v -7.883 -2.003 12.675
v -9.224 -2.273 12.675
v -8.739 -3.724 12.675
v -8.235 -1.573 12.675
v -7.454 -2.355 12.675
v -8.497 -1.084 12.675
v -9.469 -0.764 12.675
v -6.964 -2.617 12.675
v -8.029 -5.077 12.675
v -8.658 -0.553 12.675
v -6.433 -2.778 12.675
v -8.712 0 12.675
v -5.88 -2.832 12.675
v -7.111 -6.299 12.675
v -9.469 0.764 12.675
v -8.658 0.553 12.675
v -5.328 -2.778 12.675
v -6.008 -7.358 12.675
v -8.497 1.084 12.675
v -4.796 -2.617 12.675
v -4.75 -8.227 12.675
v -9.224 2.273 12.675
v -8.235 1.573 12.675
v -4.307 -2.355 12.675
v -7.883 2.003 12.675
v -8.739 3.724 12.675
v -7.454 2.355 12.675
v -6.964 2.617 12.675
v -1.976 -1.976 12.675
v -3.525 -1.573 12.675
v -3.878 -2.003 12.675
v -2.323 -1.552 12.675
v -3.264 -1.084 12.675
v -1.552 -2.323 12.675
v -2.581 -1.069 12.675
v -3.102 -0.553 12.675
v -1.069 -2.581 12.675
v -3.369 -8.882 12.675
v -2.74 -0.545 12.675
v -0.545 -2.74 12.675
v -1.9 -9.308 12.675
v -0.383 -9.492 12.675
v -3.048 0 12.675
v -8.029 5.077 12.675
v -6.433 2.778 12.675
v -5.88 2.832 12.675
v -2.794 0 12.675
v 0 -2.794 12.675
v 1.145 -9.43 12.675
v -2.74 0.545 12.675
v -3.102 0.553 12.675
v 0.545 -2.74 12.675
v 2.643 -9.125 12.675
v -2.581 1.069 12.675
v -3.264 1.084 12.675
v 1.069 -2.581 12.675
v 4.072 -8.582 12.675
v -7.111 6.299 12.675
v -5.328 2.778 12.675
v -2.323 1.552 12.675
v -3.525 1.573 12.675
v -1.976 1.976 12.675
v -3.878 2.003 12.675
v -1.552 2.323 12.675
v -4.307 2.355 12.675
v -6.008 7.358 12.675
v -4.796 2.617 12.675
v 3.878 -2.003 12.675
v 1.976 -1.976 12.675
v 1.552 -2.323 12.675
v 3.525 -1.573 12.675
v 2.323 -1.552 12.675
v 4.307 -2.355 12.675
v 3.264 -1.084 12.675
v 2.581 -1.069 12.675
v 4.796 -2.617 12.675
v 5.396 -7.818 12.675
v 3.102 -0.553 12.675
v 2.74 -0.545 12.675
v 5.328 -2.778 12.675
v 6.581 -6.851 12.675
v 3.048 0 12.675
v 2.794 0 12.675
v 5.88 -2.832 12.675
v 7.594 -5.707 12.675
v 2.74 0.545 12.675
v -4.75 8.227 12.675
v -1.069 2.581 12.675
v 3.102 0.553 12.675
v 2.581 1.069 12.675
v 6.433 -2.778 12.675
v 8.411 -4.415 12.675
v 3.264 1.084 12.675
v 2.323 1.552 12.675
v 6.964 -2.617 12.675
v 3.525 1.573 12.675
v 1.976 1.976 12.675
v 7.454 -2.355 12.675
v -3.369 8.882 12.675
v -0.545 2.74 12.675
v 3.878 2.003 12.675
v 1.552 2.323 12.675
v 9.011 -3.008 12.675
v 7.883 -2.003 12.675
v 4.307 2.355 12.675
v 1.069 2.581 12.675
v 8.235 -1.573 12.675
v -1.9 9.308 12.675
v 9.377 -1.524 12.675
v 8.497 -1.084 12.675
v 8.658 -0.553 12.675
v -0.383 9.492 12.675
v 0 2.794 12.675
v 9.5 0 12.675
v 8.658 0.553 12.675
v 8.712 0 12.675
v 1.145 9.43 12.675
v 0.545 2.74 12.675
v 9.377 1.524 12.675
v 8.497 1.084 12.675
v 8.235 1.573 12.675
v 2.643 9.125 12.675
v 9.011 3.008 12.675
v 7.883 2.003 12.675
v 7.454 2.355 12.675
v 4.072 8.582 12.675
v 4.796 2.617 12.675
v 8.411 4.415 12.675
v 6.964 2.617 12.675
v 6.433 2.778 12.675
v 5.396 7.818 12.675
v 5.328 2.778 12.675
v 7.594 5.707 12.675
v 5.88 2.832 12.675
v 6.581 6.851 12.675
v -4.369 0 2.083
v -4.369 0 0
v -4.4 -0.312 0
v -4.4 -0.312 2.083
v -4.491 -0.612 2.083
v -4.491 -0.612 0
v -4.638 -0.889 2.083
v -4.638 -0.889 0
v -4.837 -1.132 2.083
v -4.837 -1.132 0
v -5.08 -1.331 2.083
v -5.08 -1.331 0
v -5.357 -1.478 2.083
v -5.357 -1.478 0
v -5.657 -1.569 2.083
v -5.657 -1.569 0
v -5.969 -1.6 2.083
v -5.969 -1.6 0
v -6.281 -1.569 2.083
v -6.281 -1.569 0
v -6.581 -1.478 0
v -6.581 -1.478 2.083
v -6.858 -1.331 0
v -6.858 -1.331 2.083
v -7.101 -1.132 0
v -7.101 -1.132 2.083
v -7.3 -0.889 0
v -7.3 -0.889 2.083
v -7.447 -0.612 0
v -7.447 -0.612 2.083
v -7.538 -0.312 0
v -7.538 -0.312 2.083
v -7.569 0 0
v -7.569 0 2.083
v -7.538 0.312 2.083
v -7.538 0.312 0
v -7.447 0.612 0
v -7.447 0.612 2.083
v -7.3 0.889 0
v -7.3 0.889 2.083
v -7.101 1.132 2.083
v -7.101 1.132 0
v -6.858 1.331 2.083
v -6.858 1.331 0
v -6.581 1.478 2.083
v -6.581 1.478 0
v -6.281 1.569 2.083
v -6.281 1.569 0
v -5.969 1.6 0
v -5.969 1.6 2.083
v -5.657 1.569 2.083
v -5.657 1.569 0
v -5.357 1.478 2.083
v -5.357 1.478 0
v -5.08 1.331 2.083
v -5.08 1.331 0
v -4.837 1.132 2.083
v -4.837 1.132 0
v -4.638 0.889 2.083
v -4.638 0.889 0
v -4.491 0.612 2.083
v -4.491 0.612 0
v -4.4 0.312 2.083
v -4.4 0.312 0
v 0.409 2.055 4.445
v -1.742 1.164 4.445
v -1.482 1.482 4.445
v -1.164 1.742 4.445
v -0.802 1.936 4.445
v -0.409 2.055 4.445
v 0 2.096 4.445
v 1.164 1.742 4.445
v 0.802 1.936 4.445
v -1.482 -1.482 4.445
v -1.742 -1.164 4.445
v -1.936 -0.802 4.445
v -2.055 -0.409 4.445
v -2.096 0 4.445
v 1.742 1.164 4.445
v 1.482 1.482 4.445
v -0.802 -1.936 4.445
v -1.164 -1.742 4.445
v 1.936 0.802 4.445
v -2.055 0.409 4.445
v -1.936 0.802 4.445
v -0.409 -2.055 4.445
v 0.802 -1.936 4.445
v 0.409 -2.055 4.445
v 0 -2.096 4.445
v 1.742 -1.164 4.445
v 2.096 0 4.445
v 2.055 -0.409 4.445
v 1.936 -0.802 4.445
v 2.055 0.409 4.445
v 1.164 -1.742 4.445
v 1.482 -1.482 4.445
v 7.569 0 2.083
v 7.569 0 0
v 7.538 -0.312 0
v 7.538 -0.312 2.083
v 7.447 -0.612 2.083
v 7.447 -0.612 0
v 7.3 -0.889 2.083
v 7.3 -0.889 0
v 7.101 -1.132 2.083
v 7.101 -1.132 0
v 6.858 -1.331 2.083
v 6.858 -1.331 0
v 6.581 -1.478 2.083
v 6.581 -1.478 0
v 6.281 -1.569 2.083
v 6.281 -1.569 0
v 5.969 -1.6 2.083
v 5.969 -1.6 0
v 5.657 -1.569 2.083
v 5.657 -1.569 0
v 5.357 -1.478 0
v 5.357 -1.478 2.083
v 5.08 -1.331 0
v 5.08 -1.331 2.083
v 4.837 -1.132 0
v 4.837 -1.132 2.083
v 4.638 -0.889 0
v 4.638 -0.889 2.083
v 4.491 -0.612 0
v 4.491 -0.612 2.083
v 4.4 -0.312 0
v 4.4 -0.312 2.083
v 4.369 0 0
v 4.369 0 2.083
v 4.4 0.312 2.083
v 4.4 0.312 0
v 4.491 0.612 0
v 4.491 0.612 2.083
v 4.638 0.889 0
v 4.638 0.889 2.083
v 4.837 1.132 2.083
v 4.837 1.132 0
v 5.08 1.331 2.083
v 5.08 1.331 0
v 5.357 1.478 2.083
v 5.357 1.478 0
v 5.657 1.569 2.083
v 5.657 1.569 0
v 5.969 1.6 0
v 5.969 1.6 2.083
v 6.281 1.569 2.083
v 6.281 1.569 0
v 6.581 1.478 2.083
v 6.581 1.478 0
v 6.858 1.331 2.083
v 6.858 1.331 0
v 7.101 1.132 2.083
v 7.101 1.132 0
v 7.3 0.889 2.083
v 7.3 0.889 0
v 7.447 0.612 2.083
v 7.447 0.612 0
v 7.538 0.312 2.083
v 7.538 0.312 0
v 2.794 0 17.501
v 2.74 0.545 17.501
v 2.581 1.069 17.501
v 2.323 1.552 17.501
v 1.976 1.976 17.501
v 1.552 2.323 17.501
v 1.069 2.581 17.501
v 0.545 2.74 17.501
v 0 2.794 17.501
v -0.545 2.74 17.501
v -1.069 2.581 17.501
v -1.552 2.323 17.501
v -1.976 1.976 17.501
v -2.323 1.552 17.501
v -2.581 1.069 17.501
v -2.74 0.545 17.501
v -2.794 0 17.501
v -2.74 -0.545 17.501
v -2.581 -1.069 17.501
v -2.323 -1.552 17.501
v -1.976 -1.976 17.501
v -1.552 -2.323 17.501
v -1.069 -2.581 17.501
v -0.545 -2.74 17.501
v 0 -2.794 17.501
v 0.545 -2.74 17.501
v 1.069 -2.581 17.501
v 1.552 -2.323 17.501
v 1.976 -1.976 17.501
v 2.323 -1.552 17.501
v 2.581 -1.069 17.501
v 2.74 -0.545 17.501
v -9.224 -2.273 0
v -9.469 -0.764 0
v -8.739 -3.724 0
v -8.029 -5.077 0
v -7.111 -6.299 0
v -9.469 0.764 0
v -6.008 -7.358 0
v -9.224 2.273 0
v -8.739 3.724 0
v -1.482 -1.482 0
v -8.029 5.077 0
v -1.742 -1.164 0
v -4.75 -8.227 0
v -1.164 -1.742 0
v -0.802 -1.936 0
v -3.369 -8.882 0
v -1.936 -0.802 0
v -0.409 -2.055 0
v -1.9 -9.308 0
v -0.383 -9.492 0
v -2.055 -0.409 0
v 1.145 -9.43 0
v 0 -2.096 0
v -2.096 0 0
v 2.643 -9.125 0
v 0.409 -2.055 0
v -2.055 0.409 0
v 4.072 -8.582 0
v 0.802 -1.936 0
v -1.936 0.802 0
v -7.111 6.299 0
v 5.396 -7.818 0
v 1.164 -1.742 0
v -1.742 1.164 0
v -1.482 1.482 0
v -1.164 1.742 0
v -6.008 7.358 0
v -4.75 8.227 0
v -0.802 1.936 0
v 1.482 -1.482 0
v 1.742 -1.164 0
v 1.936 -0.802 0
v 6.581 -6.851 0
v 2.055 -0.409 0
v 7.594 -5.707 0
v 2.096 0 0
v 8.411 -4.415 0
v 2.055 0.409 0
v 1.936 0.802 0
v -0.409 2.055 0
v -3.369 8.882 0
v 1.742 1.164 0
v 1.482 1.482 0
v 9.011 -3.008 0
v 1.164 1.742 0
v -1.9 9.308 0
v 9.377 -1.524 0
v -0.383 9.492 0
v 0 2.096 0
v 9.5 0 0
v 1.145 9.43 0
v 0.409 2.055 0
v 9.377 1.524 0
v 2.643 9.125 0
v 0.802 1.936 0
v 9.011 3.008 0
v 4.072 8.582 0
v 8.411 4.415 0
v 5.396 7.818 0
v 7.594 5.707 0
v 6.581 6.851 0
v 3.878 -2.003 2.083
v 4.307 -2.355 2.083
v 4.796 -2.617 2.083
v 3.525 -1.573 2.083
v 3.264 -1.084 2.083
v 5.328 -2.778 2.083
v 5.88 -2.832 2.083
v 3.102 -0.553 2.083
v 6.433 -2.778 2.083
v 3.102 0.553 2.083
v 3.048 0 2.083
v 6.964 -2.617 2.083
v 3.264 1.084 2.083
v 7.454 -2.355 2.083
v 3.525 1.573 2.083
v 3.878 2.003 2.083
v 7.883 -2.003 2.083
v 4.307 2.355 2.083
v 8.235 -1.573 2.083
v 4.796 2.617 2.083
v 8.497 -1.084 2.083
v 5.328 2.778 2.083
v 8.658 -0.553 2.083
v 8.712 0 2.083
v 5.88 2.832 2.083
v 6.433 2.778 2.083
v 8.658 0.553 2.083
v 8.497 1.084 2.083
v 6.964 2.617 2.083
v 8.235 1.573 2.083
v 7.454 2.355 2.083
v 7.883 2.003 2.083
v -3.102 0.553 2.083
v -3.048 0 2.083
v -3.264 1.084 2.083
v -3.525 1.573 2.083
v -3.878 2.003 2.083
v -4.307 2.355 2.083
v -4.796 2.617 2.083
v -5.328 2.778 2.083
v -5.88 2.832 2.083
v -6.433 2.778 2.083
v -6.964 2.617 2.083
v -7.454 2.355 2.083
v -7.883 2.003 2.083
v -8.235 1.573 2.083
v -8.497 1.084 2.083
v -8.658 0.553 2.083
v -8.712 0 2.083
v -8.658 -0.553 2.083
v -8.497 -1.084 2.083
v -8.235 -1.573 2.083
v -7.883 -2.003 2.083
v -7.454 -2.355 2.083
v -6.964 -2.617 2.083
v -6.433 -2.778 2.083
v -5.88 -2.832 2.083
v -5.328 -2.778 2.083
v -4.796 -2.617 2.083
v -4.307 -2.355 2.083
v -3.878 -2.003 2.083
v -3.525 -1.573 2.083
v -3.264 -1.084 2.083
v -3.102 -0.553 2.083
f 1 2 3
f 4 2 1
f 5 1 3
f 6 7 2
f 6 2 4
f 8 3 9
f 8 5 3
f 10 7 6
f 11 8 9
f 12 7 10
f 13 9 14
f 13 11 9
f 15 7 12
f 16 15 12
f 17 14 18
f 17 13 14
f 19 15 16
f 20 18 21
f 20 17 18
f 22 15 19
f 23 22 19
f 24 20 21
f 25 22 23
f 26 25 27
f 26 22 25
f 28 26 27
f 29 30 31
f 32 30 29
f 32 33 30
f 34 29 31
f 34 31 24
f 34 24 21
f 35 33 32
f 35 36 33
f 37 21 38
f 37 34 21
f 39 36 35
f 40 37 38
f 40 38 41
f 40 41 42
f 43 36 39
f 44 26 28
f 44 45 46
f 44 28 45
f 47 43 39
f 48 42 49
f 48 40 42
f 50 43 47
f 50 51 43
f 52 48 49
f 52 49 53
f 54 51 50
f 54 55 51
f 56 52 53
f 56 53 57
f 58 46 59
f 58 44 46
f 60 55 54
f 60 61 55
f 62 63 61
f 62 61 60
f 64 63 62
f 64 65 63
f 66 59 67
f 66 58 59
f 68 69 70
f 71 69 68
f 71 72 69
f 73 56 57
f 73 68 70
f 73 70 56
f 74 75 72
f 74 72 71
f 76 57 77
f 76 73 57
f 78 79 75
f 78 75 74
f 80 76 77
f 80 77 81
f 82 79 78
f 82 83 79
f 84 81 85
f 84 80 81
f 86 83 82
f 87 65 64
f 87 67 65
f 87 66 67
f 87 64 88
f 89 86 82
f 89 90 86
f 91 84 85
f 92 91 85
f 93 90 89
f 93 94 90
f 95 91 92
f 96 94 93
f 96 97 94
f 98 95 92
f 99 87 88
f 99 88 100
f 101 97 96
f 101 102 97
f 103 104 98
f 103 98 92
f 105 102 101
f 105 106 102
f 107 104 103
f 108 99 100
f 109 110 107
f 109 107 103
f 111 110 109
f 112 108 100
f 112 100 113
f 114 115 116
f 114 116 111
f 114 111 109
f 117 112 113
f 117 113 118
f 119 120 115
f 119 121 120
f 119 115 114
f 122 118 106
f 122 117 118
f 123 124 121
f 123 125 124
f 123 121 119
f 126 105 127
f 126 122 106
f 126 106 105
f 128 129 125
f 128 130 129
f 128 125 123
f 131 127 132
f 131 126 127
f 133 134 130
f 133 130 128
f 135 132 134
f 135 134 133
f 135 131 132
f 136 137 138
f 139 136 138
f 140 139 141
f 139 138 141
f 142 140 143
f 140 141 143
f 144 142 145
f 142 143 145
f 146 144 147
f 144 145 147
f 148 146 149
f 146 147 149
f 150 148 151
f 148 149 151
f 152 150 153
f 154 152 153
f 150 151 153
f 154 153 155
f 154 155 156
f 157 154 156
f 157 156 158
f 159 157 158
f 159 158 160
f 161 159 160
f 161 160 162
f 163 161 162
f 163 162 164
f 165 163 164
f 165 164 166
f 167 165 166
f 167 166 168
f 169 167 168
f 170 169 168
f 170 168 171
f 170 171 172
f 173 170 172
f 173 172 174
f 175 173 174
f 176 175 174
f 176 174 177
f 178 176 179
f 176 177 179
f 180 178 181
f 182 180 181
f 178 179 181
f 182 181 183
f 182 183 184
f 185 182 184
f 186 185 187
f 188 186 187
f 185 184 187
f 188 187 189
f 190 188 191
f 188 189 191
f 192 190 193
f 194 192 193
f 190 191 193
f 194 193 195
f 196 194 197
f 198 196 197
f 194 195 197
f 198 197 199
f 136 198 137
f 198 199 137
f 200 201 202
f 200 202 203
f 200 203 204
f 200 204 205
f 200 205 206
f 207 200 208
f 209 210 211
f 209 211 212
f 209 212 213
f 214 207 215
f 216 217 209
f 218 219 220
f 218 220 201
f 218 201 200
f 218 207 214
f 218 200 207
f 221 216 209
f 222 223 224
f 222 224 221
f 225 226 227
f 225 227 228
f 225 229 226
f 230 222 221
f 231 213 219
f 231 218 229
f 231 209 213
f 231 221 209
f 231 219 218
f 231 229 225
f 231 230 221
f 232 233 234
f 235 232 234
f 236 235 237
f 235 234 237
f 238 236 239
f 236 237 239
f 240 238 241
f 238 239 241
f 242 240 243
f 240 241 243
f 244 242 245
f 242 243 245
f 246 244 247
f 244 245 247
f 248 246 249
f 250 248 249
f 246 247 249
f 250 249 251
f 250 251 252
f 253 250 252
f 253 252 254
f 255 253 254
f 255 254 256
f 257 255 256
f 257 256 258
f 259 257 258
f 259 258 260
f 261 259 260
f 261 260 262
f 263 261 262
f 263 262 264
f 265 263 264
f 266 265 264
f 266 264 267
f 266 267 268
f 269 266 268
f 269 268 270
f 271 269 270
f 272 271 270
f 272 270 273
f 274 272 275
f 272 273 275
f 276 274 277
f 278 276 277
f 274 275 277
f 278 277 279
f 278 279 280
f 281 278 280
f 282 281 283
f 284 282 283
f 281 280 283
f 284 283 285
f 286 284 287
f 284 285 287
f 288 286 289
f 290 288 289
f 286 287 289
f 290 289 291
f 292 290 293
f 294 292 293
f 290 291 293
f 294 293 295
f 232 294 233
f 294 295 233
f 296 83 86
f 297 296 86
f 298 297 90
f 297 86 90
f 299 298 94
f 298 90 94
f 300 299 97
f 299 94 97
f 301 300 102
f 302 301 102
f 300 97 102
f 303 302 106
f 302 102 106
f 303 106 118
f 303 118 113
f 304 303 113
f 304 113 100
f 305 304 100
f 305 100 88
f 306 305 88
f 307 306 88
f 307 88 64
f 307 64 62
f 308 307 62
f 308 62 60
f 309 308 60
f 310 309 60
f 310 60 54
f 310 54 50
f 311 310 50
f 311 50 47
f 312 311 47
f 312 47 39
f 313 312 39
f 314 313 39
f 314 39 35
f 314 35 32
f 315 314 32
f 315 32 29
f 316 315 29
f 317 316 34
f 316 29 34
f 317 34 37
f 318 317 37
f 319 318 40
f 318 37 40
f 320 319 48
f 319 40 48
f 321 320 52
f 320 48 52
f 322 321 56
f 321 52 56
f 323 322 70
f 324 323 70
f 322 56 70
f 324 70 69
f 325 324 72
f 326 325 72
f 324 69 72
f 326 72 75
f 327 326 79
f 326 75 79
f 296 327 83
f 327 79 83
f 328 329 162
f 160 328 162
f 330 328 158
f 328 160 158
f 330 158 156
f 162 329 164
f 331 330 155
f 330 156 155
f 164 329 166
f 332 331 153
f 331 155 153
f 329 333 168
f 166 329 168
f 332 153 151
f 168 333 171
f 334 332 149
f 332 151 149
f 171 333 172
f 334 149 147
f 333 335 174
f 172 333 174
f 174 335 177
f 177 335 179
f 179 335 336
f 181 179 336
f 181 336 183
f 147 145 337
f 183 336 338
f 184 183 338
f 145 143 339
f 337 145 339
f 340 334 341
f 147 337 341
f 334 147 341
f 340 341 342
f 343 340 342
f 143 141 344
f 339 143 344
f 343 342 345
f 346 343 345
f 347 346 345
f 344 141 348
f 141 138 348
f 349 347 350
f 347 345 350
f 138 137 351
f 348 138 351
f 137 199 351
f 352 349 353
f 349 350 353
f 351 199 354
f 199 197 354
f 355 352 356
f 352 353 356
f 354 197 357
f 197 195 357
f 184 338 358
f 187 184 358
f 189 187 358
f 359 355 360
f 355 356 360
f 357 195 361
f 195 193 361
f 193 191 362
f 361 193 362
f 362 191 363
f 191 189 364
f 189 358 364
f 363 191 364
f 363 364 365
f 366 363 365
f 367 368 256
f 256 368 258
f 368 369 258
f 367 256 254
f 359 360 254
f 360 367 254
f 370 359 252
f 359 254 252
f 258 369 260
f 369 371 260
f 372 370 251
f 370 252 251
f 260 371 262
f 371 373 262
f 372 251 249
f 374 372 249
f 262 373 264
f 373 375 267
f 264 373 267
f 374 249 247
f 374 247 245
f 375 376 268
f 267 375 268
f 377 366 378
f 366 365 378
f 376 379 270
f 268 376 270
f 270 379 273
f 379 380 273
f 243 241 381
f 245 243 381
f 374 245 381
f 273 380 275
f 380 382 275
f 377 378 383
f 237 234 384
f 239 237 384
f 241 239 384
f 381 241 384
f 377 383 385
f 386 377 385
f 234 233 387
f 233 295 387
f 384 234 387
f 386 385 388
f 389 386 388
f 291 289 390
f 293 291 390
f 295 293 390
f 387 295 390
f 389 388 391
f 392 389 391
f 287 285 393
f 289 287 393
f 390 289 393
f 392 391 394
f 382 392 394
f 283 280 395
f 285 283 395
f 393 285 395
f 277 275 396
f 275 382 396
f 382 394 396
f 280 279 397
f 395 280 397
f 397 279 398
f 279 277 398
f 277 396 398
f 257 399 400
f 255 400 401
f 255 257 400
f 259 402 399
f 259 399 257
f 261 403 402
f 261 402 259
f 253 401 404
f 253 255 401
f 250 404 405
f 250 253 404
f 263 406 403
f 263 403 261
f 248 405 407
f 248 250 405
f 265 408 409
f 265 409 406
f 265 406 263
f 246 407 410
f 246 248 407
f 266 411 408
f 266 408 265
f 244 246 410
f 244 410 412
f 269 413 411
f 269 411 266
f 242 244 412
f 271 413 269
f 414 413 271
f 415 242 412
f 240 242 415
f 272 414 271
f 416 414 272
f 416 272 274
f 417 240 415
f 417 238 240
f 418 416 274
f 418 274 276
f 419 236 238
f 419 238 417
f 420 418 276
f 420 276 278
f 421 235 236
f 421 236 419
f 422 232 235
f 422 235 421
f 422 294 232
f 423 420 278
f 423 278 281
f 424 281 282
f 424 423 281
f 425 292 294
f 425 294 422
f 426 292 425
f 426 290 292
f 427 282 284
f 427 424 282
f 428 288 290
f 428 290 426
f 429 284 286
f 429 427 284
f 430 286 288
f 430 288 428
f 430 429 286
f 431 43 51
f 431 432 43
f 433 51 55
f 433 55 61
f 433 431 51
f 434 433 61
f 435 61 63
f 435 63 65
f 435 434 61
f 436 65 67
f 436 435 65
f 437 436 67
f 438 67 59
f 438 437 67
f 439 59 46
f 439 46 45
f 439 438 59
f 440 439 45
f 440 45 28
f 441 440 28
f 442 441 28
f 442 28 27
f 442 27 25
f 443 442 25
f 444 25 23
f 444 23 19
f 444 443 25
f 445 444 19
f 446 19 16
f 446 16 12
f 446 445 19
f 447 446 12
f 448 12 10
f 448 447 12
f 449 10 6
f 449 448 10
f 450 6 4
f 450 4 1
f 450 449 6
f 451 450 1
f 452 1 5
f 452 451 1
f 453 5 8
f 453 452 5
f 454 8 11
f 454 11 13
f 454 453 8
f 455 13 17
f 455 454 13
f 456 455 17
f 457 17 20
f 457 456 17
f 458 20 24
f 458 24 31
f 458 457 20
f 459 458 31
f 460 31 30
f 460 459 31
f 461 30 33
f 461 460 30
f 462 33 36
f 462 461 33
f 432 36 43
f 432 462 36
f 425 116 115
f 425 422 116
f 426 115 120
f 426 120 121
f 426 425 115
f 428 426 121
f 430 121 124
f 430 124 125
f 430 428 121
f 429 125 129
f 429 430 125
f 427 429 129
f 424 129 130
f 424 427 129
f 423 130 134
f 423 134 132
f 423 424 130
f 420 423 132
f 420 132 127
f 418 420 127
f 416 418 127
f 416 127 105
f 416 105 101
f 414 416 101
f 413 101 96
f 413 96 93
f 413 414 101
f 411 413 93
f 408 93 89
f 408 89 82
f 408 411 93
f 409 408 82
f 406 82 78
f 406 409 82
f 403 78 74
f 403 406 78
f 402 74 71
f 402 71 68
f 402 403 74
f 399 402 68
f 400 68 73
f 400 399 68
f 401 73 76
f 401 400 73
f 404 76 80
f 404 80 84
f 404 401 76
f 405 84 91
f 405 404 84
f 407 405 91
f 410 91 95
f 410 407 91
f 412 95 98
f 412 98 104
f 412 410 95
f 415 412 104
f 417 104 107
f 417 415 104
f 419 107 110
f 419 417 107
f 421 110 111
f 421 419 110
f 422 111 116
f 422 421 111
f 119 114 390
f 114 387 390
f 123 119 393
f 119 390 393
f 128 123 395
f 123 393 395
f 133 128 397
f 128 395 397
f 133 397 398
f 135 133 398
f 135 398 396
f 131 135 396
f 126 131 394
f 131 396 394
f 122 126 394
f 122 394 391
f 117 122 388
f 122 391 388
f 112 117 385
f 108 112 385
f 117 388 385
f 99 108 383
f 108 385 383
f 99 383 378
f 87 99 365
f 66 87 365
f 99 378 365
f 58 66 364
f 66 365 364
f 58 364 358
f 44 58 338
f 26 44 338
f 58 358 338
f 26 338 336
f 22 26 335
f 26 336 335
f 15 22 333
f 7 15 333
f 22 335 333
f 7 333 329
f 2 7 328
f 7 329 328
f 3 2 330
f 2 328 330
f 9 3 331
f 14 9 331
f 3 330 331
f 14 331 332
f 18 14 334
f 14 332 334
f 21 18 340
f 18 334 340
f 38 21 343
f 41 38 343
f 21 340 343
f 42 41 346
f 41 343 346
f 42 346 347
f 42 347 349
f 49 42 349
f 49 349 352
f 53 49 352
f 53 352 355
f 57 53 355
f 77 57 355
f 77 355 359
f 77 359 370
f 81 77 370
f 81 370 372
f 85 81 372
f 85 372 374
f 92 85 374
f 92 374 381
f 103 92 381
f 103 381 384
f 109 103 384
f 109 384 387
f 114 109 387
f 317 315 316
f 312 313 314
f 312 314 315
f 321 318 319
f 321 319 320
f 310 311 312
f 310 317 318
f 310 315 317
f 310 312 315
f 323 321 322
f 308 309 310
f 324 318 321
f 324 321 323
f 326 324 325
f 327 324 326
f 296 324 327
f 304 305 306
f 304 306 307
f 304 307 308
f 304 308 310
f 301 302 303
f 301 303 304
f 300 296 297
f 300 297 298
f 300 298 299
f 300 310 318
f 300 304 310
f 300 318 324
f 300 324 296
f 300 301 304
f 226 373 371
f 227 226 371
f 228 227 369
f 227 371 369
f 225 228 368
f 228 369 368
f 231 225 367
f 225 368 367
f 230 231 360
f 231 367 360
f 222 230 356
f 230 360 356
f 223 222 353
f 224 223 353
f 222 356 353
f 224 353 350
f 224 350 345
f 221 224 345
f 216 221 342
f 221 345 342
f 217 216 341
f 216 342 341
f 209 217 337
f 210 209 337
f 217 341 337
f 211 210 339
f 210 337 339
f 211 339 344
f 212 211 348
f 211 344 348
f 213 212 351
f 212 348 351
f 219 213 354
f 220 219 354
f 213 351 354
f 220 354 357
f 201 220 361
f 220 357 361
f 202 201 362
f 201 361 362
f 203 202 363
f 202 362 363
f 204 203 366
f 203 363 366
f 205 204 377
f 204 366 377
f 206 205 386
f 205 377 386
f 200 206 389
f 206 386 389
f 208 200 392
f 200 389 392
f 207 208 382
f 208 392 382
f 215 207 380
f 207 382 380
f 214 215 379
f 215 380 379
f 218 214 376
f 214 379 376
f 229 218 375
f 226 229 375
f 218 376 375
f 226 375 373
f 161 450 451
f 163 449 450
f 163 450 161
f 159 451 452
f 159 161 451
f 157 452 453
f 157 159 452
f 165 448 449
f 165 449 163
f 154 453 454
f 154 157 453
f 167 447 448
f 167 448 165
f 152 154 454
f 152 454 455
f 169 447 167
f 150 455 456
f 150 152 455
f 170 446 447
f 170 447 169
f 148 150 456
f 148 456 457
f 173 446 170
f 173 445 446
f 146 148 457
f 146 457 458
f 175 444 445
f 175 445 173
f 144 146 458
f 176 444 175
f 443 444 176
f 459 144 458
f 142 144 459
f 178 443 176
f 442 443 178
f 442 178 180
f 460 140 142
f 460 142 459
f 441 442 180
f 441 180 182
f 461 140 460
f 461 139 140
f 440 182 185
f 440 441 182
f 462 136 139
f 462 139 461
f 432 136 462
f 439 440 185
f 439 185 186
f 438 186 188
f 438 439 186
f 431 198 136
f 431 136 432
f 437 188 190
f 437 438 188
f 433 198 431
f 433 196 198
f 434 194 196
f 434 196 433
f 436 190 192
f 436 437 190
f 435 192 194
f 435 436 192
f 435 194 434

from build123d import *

# Parameters (mm, degrees)
F0_R      = 9.4996
F1_DEPTH  = 5.461
F2_R      = 2.794
F3_DEPTH  = 12.0396
F4_R      = 2.8321
F5_DEPTH  = 3.3782
F6_R      = 2.0955
F7_DEPTH  = 4.445
F8_R      = 1.6002
F9_DEPTH  = 25.4
F10_DEPTH = 7.2136


with BuildPart() as f1:
    # F0 (on Top) → F1 (new body)
    with BuildSketch(Plane.XY):
        Circle(F0_R)
    extrude(amount=F1_DEPTH)

    # F2 (on face) → F3 (join)
    with BuildSketch(Plane.XY.offset(5.461)):
        Circle(F2_R)
    extrude(amount=F3_DEPTH)

    # F4 (on face) → F5 (cut)
    with BuildSketch(Plane.XY.offset(5.461)):
        with Locations((-5.8801, 0)):
            Circle(F4_R)
        with Locations((5.8801, 0)):
            Circle(F4_R)
    extrude(amount=-F5_DEPTH, mode=Mode.SUBTRACT)

    # F6 (on face) → F7 (cut)
    with BuildSketch(Plane(origin=(0, 0, 0), x_dir=(1, 0, 0), z_dir=(0, 0, -1))):
        Circle(F6_R)
    extrude(amount=-F7_DEPTH, mode=Mode.SUBTRACT)

    # F8 (on face) → F9 (cut)
    with BuildSketch(Plane(origin=(0, 0, 0), x_dir=(1, 0, 0), z_dir=(0, 0, -1))):
        with Locations((5.969, 0)):
            Circle(F8_R)
        with Locations((-5.969, 0)):
            Circle(F8_R)
    extrude(amount=-F9_DEPTH, mode=Mode.SUBTRACT)

    # F10 (add): a face of the model
    f10_faces = [f1.faces().sort_by_distance(p)[0] for p in [
        (-9.2309107369, 0, 5.461),
    ]]
    extrude(f10_faces, amount=F10_DEPTH)


solid = f1.part
